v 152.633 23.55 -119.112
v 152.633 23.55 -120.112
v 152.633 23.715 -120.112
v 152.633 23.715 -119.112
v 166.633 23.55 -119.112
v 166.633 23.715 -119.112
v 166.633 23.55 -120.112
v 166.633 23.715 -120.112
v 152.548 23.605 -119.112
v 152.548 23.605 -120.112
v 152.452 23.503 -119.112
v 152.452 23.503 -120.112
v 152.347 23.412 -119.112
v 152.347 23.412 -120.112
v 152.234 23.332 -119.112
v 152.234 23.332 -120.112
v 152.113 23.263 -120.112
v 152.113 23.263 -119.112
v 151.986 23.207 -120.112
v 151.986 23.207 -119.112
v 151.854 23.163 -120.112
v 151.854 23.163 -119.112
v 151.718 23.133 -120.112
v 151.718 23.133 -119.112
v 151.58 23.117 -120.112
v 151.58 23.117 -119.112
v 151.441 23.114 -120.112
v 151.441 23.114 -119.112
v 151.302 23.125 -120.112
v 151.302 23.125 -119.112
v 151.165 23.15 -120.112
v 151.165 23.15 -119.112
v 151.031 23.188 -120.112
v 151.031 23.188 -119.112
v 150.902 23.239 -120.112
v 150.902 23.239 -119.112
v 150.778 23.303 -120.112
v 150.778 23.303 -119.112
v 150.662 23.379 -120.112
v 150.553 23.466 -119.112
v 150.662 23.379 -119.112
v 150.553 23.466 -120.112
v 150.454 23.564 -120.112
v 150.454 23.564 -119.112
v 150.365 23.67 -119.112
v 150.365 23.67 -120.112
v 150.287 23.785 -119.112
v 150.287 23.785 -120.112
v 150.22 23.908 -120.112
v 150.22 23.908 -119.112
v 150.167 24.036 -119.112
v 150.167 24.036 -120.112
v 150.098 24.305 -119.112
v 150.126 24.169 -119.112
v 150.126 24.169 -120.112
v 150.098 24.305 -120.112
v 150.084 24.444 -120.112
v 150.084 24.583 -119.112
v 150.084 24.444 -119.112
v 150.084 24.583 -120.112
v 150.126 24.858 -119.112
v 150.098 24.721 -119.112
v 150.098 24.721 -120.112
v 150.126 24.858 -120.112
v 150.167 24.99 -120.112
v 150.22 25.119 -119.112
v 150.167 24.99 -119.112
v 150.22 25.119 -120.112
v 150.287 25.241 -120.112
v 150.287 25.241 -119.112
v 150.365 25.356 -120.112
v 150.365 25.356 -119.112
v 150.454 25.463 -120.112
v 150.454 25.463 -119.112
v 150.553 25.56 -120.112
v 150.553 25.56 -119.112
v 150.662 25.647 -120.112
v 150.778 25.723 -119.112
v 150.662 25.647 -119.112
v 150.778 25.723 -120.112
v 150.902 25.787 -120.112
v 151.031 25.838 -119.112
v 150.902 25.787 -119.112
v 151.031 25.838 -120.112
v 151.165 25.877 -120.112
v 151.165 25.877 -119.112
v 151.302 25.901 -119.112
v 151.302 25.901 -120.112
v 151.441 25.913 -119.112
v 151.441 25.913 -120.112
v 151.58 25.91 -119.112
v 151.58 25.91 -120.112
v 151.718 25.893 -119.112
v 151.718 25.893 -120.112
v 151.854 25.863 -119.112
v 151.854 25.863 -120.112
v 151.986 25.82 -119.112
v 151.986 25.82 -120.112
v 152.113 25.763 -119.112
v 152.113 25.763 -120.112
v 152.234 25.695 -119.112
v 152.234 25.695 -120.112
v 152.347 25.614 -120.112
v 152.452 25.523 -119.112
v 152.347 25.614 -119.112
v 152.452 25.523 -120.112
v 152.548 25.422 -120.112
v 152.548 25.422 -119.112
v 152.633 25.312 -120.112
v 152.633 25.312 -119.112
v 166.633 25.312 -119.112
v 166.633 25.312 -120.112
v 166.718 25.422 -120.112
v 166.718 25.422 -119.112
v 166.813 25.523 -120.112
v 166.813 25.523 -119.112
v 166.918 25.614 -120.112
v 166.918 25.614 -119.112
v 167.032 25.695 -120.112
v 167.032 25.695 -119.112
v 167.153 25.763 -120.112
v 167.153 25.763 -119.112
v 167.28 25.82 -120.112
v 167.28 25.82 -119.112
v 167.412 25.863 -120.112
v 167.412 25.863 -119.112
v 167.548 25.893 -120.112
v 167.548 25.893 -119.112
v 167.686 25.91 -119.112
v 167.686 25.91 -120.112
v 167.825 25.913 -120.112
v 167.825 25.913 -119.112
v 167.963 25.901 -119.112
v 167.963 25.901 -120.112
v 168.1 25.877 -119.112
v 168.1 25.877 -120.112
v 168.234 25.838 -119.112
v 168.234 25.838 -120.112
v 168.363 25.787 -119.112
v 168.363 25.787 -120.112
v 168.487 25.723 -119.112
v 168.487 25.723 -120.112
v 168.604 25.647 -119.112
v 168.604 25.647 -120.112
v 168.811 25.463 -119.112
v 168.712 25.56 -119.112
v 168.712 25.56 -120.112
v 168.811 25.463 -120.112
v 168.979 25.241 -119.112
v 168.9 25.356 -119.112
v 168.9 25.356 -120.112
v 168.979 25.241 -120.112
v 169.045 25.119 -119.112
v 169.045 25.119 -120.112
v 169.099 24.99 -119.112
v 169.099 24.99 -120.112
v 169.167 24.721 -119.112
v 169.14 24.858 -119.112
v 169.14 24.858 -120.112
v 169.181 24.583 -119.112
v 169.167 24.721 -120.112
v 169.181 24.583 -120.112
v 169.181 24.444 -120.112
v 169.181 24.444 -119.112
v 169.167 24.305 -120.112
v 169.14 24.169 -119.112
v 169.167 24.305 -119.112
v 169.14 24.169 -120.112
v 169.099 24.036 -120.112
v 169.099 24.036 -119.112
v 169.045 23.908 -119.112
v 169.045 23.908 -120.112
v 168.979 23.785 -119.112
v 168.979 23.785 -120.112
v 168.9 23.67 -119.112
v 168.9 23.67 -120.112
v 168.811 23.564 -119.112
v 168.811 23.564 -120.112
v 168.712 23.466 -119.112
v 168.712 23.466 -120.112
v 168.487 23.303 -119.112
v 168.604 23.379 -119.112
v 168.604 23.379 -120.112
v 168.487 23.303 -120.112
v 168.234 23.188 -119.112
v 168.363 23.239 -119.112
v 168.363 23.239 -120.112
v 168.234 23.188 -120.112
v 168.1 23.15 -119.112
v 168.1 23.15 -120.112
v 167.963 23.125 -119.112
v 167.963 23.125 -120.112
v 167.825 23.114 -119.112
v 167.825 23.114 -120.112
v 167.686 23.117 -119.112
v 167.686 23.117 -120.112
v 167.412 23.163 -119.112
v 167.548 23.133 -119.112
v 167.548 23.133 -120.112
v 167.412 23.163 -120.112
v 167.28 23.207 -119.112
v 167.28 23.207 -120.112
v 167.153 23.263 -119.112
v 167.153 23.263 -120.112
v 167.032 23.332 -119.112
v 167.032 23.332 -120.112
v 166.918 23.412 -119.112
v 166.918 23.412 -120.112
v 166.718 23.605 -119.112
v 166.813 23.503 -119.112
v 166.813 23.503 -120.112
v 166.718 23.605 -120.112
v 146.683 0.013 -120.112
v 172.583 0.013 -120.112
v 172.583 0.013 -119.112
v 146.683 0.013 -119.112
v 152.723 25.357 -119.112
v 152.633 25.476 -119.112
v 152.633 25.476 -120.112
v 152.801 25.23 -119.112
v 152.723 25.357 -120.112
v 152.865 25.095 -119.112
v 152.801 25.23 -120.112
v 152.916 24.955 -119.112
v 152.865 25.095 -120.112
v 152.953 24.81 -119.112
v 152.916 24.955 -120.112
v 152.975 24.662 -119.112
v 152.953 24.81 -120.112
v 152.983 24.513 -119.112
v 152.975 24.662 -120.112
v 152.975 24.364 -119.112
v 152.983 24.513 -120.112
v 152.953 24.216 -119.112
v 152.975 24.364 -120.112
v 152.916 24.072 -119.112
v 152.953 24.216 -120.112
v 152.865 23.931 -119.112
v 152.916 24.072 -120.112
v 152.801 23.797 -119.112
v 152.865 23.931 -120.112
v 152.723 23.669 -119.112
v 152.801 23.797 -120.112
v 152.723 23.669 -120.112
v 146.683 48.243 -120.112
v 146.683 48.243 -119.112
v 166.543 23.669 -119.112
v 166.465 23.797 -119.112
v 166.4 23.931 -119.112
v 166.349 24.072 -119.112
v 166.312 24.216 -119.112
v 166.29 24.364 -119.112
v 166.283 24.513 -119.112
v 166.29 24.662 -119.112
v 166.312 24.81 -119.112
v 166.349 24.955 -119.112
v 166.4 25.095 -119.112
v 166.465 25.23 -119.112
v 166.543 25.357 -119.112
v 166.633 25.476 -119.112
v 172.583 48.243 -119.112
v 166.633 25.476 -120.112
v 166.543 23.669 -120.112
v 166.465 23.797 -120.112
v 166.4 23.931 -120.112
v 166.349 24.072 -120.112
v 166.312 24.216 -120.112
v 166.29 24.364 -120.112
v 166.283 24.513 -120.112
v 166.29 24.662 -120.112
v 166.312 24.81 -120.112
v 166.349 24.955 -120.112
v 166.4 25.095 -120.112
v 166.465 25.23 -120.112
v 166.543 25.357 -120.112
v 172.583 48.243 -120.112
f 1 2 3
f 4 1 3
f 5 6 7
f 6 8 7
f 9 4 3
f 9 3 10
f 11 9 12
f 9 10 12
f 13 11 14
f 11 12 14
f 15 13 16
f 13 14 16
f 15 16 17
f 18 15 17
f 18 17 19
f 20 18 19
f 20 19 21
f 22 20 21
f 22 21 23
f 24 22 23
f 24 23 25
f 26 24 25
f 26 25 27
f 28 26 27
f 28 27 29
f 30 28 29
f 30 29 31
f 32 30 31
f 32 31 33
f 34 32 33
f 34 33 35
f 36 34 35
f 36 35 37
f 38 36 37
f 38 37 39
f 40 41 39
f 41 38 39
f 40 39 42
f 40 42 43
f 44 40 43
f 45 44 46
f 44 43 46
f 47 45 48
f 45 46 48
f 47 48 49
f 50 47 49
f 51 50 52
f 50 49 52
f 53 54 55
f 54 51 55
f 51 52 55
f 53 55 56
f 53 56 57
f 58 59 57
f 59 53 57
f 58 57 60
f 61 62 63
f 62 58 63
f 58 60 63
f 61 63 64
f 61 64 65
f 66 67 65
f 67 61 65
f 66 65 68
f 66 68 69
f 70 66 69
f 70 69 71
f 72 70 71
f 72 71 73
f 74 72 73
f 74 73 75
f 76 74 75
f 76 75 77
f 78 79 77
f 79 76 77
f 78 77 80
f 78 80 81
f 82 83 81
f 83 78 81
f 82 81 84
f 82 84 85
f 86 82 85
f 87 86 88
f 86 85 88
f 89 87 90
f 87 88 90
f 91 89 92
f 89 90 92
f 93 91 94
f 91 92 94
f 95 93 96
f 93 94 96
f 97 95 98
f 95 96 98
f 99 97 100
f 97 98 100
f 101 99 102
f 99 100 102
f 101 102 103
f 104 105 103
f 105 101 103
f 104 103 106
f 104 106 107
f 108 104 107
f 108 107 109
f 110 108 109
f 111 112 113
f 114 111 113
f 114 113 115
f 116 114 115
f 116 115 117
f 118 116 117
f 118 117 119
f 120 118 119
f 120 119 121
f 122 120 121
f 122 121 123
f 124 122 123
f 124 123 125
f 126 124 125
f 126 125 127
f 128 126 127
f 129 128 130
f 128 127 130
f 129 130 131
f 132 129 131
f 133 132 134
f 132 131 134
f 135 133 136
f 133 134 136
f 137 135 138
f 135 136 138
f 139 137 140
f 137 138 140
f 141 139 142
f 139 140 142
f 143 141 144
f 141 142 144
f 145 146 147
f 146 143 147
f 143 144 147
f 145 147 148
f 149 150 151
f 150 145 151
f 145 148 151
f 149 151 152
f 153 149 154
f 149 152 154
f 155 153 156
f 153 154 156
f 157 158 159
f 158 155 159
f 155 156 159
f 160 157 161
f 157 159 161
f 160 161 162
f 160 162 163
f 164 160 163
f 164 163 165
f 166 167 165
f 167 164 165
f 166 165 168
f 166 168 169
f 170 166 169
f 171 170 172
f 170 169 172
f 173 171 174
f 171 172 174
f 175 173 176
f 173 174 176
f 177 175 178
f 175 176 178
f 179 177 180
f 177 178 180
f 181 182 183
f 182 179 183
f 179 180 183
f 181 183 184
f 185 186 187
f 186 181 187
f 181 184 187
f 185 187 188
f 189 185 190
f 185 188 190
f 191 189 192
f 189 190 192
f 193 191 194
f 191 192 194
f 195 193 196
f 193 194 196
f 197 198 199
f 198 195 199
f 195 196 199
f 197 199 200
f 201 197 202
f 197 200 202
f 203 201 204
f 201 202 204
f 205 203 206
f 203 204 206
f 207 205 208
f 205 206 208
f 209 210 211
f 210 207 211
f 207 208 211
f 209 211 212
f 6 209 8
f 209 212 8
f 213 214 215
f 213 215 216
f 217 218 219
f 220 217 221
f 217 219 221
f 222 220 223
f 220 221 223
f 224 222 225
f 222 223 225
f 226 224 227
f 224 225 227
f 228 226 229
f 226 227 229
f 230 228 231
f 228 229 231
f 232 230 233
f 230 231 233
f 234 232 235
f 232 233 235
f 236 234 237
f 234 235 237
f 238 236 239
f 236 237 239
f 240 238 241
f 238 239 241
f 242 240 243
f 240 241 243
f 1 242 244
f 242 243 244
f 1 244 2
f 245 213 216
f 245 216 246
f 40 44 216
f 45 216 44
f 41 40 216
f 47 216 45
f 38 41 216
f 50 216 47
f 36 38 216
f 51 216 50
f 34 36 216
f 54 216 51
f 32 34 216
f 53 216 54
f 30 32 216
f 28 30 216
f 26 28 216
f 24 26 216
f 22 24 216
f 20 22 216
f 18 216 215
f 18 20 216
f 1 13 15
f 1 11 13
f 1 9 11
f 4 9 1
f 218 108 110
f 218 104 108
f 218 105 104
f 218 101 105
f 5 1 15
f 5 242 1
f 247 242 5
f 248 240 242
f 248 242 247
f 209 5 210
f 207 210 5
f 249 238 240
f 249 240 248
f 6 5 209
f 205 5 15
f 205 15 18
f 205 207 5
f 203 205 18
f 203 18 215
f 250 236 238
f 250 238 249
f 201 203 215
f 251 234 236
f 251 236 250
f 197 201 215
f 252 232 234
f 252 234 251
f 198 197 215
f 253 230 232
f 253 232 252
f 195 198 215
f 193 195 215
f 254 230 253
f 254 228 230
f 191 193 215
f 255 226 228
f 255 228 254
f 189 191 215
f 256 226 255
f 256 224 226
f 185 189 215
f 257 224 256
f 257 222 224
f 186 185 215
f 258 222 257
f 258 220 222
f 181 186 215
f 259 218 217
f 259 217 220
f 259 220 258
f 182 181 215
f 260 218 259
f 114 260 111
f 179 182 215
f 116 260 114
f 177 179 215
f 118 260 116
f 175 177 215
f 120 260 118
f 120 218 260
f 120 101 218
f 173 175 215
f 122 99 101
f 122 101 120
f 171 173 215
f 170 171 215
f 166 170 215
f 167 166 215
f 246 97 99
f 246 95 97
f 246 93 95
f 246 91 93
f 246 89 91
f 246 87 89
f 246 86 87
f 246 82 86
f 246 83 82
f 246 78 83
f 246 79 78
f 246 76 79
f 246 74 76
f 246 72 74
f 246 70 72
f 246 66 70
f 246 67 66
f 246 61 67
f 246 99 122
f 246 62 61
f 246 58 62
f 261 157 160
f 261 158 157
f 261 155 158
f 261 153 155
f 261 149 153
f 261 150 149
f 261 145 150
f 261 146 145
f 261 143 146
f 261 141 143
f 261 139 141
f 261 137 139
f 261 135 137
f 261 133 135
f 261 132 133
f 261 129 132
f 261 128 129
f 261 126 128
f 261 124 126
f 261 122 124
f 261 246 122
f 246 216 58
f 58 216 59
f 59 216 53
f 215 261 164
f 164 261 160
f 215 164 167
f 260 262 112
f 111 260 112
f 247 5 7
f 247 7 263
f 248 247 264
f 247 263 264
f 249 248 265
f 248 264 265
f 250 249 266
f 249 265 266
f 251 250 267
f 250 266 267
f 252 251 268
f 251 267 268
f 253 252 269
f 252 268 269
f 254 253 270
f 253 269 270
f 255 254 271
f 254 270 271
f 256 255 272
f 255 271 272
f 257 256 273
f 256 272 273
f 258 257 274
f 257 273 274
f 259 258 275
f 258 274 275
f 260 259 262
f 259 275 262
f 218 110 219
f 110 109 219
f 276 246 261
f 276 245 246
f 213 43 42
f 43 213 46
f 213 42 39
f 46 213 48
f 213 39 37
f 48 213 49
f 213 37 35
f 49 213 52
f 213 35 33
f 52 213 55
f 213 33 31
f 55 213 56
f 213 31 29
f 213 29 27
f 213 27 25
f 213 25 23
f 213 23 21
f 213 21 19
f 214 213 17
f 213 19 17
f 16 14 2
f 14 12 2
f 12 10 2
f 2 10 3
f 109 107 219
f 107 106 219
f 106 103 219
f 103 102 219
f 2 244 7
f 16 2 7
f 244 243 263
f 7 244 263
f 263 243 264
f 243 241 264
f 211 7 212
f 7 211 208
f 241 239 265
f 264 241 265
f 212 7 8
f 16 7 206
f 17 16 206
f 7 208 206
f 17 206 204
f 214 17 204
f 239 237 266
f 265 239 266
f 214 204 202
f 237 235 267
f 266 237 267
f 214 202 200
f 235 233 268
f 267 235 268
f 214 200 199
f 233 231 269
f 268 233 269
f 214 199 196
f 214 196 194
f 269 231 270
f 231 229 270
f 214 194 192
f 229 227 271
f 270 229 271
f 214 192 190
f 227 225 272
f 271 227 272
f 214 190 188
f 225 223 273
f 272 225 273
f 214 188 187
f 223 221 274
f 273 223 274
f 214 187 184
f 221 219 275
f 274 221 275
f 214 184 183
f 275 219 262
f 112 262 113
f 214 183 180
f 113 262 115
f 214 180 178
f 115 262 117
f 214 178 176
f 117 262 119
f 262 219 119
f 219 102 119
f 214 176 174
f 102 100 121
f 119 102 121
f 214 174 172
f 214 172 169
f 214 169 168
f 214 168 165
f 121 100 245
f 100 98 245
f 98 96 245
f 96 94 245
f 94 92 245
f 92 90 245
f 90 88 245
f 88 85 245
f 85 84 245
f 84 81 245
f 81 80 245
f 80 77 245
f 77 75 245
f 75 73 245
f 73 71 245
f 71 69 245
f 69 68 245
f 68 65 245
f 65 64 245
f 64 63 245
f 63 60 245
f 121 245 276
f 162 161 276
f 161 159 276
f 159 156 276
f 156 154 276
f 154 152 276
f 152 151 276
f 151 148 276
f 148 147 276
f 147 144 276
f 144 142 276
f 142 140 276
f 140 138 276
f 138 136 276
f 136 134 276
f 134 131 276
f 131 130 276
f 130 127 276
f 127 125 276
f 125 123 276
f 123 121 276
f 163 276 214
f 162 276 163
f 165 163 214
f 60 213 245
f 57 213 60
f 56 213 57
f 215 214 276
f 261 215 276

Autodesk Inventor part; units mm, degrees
ref_plane "YZ Plane" through (0, 0, 0) normal (1, 0, 0) x (0, 1, 0)
ref_plane "XZ Plane" through (0, 0, 0) normal (0, 1, 0) x (-1, 0, 0)
ref_plane "XY Plane" through (0, 0, 0) normal (0, 0, 1) x (1, 0, 0)
ref_plane "Work Plane1" through (146.6827, 0.0132, -120.1119) normal (0, 0, 1) x (1, 0, 0)
sketch "Sketch1" plane through (146.6827, 0.0132, -120.1119) normal (0, 0, 1) x (1, 0, 0)
  arc A0 (5.95, 25.2984) -> (5.95, 23.7016) centre (4.8, 24.5) ccw projected
  line L0 (5.95, 25.2984) -> (5.95, 48.23) projected
  line L1 (0, 48.23) -> (5.95, 48.23) projected
  line L2 (0, 0) -> (0, 48.23) projected
  line L3 (5.95, 0) -> (0, 0) projected
  line L4 (5.95, 0) -> (5.95, 23.7016) projected
  arc A1 (19.95, 23.7016) -> (19.95, 25.2984) centre (21.1, 24.5) ccw projected
  line L5 (19.95, 23.7016) -> (19.95, 0) projected
  line L6 (25.9, 0) -> (19.95, 0) projected
  line L7 (25.9, 0) -> (25.9, 48.23) projected
  line L8 (19.95, 48.23) -> (25.9, 48.23) projected
  line L9 (19.95, 48.23) -> (19.95, 25.2984) projected
  line L10 (0, 48.23) -> (25.9, 48.23)
  line L11 (25.9, 48.23) -> (25.9, 0)
  line L12 (25.9, 0) -> (0, 0)
  line L13 (0, 0) -> (0, 48.23)
  circle A2 centre (4.8, 24.5) radius 1.5
  circle A3 centre (21.1, 24.5) radius 1.5
  point P0 (-146.6827, -0.0132)
  dimension "d0" = 3
  dimension "d1" = 3
extrude "Extrusion1" add sketch "Sketch1" along normal blind 1 contours A0 L4 A2 L0 | A2 L4 L3 L2 L1 L0 | L0 L10 L9 A3 L5 L12 L4 A2 | L8 L7 L6 L5 A3 L9 | A3 L5 A1 L9 picked at (3.3735, 24.5) picked at (22.5265, 24.5)
properties part number "cellSTORM_v5_laser_532nm_adapter"
